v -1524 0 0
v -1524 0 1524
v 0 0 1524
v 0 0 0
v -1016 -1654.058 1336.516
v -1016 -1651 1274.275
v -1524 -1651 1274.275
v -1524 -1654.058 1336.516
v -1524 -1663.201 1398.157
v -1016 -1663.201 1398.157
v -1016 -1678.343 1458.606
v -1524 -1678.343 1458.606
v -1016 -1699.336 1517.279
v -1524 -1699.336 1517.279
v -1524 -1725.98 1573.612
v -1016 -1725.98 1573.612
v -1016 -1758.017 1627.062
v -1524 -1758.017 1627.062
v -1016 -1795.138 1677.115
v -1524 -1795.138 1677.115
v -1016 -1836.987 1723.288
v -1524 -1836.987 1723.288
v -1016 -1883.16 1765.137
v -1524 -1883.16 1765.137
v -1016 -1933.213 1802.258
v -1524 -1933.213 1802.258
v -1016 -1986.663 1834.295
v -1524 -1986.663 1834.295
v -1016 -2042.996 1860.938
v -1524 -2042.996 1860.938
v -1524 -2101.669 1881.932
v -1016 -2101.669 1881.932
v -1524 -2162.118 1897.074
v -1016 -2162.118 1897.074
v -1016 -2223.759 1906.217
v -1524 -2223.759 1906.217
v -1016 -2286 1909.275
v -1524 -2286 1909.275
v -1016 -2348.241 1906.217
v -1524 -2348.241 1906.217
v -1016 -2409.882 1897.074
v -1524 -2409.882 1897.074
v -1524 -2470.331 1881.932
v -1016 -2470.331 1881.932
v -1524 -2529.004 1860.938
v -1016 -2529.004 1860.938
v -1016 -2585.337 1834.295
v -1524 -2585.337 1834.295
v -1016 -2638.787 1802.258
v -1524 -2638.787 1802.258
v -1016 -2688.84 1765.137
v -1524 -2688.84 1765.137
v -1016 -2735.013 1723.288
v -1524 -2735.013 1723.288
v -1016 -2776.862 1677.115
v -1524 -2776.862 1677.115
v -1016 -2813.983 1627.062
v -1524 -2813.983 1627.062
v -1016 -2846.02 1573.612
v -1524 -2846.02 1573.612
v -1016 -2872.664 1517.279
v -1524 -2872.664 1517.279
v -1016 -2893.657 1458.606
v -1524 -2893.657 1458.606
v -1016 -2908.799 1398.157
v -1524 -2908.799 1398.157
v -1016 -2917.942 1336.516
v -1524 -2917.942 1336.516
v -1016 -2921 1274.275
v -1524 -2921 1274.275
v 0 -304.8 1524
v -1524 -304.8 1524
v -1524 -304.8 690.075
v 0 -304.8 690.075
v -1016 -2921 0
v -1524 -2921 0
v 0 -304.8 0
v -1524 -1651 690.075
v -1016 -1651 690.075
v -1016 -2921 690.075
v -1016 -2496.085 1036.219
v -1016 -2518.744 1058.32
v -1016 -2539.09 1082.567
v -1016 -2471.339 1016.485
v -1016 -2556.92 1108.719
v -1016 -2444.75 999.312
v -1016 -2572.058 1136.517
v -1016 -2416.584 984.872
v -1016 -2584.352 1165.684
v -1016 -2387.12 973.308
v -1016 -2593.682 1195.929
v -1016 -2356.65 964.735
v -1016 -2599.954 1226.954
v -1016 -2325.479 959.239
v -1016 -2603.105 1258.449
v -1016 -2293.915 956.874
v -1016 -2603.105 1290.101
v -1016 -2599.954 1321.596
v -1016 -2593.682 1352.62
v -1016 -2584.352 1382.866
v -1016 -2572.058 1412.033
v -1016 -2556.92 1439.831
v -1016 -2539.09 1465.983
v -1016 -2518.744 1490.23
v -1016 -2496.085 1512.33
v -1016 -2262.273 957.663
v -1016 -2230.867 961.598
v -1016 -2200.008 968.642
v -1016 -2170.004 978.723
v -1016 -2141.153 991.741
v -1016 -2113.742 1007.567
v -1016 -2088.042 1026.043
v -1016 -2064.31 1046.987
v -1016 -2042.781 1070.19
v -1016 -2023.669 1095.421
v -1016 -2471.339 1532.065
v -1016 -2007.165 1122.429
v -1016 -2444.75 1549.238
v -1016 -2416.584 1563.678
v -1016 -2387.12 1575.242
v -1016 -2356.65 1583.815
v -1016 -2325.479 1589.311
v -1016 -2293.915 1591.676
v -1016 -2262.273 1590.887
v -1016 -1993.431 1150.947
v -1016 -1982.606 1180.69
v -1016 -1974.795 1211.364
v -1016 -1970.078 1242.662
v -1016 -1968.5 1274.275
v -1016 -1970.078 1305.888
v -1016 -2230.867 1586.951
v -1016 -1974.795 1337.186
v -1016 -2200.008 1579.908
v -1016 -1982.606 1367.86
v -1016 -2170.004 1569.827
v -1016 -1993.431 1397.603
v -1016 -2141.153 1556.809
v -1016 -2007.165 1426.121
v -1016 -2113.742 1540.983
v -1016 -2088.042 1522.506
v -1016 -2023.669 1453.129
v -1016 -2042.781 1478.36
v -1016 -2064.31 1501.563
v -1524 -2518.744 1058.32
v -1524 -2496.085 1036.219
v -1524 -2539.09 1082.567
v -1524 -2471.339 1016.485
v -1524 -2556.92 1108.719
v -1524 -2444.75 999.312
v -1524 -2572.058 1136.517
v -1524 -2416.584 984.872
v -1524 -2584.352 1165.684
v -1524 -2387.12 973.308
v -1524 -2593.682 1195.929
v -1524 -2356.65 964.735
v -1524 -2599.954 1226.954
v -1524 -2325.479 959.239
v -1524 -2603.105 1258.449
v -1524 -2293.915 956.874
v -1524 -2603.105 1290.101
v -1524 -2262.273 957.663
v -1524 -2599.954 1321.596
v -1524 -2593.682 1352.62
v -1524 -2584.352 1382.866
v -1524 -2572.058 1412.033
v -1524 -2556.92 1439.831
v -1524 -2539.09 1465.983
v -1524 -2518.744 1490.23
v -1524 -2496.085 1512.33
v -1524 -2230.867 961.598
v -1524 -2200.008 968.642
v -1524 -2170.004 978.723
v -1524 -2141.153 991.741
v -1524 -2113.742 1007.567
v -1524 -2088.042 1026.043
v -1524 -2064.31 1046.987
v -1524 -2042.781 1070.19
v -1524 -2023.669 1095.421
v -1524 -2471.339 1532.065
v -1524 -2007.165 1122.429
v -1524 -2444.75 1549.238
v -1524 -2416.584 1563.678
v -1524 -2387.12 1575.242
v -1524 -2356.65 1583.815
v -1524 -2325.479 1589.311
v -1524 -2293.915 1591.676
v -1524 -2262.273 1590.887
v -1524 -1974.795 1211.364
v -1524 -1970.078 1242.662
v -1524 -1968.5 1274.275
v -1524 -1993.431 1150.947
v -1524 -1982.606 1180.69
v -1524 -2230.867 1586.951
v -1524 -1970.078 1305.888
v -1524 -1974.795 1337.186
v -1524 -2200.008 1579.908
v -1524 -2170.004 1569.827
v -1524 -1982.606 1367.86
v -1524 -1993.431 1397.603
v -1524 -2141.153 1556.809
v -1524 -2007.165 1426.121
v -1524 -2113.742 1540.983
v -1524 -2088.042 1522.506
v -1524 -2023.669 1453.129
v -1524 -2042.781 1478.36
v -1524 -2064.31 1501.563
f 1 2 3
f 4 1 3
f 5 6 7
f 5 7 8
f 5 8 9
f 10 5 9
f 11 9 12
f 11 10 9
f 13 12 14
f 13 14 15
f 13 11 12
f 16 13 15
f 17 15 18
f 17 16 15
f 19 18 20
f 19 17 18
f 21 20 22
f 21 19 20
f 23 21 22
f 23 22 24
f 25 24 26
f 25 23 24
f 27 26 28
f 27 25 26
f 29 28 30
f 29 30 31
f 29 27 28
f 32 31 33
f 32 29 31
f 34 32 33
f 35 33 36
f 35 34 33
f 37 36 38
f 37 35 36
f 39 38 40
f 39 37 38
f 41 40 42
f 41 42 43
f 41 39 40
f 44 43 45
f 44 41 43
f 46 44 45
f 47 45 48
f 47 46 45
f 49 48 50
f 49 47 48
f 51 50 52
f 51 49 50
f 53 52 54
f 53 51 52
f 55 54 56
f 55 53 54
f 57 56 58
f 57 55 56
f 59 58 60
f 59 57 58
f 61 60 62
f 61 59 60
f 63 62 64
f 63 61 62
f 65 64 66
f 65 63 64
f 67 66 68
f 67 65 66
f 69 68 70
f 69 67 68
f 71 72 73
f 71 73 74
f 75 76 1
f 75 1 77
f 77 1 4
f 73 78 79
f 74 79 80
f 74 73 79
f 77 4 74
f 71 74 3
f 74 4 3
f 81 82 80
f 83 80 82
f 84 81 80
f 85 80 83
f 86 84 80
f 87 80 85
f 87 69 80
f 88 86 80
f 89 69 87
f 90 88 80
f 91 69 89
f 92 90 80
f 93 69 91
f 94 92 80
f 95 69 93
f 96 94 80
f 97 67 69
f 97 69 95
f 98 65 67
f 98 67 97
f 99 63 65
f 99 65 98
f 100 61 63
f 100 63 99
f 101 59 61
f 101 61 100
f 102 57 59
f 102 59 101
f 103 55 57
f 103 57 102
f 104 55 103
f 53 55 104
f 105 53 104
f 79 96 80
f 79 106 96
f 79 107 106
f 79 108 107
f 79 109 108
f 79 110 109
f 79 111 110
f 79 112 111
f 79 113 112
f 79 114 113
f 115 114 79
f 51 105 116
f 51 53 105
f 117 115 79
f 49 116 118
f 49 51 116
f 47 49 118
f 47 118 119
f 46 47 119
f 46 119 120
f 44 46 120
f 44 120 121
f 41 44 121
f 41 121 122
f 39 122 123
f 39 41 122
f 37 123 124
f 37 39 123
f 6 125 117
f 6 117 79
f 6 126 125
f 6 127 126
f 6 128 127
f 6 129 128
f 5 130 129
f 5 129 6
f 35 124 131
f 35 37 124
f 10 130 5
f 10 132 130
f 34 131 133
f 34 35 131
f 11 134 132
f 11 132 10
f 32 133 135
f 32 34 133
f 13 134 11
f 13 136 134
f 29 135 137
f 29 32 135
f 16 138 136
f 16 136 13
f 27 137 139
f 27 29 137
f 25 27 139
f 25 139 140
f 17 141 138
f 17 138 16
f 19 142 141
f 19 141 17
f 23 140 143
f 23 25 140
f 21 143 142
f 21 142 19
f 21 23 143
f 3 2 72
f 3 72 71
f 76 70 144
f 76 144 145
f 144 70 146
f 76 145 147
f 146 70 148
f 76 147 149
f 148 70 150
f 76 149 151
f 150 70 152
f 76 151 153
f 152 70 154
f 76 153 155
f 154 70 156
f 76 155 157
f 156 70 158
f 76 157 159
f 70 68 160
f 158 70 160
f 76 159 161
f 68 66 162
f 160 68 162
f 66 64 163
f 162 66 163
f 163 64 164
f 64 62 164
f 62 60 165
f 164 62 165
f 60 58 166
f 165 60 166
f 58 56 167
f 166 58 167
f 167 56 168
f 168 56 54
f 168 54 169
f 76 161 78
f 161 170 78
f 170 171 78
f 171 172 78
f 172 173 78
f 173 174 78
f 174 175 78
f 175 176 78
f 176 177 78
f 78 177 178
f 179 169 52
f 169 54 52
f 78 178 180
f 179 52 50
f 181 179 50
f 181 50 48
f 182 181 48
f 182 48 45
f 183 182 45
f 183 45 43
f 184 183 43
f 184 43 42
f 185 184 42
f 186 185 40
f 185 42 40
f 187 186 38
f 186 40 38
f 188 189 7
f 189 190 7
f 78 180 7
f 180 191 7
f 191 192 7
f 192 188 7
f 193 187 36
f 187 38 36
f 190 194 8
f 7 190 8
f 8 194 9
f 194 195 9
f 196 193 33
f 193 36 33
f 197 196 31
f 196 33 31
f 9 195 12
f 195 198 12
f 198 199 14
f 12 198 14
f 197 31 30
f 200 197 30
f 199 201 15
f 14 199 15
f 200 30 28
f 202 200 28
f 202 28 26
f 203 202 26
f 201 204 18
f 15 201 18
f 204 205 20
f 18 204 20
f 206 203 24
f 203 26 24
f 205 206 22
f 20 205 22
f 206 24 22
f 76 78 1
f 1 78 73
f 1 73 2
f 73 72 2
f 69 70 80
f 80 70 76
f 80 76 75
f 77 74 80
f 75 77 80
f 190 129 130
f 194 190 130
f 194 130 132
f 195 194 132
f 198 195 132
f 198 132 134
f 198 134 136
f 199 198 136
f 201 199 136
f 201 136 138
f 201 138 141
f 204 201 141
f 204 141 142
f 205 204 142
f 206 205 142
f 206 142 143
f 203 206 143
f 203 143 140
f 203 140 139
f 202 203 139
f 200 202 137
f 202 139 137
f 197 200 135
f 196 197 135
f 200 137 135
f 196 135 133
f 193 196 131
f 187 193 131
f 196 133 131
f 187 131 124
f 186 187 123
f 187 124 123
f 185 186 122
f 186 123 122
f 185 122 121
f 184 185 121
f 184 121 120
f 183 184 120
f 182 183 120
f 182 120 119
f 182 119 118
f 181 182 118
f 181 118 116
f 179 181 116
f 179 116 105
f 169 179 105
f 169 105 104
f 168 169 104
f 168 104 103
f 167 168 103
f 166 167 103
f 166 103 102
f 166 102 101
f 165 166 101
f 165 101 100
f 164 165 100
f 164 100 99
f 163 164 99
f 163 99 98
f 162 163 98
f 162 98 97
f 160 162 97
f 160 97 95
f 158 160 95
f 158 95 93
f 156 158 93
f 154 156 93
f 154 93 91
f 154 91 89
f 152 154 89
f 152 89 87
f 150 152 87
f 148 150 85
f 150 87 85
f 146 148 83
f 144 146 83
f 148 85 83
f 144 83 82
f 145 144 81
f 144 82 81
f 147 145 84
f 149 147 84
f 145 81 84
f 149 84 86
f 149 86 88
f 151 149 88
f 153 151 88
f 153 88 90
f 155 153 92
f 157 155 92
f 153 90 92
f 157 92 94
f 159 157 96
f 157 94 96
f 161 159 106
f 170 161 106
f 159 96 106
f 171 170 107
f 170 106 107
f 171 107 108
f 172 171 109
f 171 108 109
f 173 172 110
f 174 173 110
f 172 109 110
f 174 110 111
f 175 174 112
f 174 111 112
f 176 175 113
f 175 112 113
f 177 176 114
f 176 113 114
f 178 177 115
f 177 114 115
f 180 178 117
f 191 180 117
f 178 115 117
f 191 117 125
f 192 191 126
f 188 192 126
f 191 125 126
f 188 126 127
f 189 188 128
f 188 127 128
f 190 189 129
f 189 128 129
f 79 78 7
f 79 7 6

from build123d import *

# Parameters (mm, degrees)
F0_W      = 1524
F0_H      = 1524
F1_DEPTH  = 304.8
F2_W      = 1524
F2_H      = 690.0749206543
F3_DEPTH  = 2616.2
F4_W      = 508
F4_H      = 1270
F5_DEPTH  = 584.2
F7_DEPTH  = 508
F10_R     = 317.5
F11_DEPTH = 812.8
F12_DEPTH = 1864.36


with BuildPart() as f1:
    # F0 (on Front) → F1 (new body)
    with BuildSketch(Plane.XZ):
        with Locations((-762, 762)):
            Rectangle(F0_W, F0_H)
    extrude(amount=F1_DEPTH)

    # F2 (on face) → F3 (join)
    with BuildSketch(Plane.XZ.offset(304.8)):
        with Locations((-762, 345.0374603271)):
            Rectangle(F2_W, F2_H)
    extrude(amount=F3_DEPTH)

    # F4 (on face) → F5 (join)
    with BuildSketch(Plane.XY.offset(690.0749206543)):
        with Locations((-1270, -2286)):
            Rectangle(F4_W, F4_H)
    extrude(amount=F5_DEPTH)

    # F6 (on face) → F7 (join)
    with BuildSketch(Plane.YZ.offset(-1016)):
        with BuildLine():
            Line((-2921, 1274.2749206543), (-1651, 1274.2749206543))
            ThreePointArc((-1651, 1274.2749206543), (-2286, 1909.2749206543), (-2921, 1274.2749206543))
        make_face()
    extrude(amount=-F7_DEPTH)

    # F10 (on face) → F11 (cut)
    with BuildSketch(Plane.YZ.offset(-1016)):
        with Locations((-2286, 1274.2749206543)):
            Circle(F10_R)
    extrude(amount=-F11_DEPTH, mode=Mode.SUBTRACT)

    # F9 (on face) → F12 (cut)
    with BuildSketch(Plane.XY.offset(690.0749206543)):
        Polygon((0, -304.8), (-1016, -2921), (0, -2921), align=None)
    extrude(amount=-F12_DEPTH, mode=Mode.SUBTRACT)


solid = f1.part
